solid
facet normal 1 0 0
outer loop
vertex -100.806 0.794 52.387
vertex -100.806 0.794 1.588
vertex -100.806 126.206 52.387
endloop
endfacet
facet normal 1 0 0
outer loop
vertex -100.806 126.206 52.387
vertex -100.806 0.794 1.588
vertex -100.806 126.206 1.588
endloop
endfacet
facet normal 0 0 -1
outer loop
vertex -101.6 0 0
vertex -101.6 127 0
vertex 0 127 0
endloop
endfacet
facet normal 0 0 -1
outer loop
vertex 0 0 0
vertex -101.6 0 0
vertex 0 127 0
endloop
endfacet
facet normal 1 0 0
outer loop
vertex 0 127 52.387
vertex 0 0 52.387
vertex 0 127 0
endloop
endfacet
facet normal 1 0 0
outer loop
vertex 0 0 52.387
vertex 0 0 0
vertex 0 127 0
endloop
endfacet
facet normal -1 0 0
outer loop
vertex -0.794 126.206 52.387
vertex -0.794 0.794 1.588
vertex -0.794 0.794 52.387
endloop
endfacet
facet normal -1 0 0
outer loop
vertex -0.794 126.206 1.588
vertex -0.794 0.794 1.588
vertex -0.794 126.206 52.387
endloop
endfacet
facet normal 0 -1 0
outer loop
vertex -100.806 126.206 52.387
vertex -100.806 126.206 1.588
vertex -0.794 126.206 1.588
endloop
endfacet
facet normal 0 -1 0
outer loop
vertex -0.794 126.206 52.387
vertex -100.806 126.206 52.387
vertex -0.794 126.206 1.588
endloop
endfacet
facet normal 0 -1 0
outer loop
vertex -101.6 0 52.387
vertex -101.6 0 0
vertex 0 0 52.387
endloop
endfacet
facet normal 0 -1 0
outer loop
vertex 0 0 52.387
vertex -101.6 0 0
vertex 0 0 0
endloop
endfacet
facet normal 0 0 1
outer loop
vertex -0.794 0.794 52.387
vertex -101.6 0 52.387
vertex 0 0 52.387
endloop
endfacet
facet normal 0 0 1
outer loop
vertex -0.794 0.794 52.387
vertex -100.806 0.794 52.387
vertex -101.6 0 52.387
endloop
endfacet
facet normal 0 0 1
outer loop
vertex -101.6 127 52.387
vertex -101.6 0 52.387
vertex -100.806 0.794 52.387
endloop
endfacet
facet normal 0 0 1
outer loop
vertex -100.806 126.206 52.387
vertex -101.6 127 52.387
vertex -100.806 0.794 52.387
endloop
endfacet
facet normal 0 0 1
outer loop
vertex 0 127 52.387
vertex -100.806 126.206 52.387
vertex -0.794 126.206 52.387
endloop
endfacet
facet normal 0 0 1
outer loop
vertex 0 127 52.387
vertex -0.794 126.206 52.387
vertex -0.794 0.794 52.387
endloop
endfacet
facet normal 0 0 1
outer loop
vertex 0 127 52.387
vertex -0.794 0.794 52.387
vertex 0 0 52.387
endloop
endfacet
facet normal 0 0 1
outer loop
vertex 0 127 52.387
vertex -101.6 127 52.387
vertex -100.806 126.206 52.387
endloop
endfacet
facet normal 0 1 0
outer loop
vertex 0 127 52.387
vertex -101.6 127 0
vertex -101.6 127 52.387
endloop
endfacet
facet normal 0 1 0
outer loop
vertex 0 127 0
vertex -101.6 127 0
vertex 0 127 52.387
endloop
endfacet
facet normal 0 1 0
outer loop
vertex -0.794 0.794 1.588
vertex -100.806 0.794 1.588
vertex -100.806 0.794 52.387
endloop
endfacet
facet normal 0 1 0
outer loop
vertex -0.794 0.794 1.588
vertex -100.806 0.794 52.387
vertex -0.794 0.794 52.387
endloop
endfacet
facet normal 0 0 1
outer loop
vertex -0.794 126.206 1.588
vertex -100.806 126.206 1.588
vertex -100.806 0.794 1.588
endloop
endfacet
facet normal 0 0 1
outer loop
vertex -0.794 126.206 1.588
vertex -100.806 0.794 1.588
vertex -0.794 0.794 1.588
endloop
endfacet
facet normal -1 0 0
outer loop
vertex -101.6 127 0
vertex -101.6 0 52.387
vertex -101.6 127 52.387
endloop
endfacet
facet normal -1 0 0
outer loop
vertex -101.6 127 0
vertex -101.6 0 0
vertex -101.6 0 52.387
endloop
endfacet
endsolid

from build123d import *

# Parameters (mm, degrees)
SKETCH1_W           = 101.6
SKETCH1_H           = 127
BOSS_EXTRUDE1_DEPTH = 1.5875
SKETCH2_W           = 101.6
SKETCH2_H           = 127
SKETCH2_W_2         = 100.0125
SKETCH2_H_2         = 125.4125
EXTRUDE_THIN1_DEPTH = 50.8


with BuildPart() as part:
    # Sketch1 → Boss-Extrude1 (new body)
    with BuildSketch(Plane.XY):
        with Locations((-50.8, 63.5)):
            Rectangle(SKETCH1_W, SKETCH1_H)
    extrude(amount=BOSS_EXTRUDE1_DEPTH)

    # Sketch2 → Extrude-Thin1 (add)
    with BuildSketch(Plane.XY.offset(1.5875)):
        with Locations((-50.8, 63.5)):
            Rectangle(SKETCH2_W, SKETCH2_H)
        with Locations((-50.8, 63.5)):
            Rectangle(SKETCH2_W_2, SKETCH2_H_2, mode=Mode.SUBTRACT)
    extrude(amount=EXTRUDE_THIN1_DEPTH)


solid = part.part
